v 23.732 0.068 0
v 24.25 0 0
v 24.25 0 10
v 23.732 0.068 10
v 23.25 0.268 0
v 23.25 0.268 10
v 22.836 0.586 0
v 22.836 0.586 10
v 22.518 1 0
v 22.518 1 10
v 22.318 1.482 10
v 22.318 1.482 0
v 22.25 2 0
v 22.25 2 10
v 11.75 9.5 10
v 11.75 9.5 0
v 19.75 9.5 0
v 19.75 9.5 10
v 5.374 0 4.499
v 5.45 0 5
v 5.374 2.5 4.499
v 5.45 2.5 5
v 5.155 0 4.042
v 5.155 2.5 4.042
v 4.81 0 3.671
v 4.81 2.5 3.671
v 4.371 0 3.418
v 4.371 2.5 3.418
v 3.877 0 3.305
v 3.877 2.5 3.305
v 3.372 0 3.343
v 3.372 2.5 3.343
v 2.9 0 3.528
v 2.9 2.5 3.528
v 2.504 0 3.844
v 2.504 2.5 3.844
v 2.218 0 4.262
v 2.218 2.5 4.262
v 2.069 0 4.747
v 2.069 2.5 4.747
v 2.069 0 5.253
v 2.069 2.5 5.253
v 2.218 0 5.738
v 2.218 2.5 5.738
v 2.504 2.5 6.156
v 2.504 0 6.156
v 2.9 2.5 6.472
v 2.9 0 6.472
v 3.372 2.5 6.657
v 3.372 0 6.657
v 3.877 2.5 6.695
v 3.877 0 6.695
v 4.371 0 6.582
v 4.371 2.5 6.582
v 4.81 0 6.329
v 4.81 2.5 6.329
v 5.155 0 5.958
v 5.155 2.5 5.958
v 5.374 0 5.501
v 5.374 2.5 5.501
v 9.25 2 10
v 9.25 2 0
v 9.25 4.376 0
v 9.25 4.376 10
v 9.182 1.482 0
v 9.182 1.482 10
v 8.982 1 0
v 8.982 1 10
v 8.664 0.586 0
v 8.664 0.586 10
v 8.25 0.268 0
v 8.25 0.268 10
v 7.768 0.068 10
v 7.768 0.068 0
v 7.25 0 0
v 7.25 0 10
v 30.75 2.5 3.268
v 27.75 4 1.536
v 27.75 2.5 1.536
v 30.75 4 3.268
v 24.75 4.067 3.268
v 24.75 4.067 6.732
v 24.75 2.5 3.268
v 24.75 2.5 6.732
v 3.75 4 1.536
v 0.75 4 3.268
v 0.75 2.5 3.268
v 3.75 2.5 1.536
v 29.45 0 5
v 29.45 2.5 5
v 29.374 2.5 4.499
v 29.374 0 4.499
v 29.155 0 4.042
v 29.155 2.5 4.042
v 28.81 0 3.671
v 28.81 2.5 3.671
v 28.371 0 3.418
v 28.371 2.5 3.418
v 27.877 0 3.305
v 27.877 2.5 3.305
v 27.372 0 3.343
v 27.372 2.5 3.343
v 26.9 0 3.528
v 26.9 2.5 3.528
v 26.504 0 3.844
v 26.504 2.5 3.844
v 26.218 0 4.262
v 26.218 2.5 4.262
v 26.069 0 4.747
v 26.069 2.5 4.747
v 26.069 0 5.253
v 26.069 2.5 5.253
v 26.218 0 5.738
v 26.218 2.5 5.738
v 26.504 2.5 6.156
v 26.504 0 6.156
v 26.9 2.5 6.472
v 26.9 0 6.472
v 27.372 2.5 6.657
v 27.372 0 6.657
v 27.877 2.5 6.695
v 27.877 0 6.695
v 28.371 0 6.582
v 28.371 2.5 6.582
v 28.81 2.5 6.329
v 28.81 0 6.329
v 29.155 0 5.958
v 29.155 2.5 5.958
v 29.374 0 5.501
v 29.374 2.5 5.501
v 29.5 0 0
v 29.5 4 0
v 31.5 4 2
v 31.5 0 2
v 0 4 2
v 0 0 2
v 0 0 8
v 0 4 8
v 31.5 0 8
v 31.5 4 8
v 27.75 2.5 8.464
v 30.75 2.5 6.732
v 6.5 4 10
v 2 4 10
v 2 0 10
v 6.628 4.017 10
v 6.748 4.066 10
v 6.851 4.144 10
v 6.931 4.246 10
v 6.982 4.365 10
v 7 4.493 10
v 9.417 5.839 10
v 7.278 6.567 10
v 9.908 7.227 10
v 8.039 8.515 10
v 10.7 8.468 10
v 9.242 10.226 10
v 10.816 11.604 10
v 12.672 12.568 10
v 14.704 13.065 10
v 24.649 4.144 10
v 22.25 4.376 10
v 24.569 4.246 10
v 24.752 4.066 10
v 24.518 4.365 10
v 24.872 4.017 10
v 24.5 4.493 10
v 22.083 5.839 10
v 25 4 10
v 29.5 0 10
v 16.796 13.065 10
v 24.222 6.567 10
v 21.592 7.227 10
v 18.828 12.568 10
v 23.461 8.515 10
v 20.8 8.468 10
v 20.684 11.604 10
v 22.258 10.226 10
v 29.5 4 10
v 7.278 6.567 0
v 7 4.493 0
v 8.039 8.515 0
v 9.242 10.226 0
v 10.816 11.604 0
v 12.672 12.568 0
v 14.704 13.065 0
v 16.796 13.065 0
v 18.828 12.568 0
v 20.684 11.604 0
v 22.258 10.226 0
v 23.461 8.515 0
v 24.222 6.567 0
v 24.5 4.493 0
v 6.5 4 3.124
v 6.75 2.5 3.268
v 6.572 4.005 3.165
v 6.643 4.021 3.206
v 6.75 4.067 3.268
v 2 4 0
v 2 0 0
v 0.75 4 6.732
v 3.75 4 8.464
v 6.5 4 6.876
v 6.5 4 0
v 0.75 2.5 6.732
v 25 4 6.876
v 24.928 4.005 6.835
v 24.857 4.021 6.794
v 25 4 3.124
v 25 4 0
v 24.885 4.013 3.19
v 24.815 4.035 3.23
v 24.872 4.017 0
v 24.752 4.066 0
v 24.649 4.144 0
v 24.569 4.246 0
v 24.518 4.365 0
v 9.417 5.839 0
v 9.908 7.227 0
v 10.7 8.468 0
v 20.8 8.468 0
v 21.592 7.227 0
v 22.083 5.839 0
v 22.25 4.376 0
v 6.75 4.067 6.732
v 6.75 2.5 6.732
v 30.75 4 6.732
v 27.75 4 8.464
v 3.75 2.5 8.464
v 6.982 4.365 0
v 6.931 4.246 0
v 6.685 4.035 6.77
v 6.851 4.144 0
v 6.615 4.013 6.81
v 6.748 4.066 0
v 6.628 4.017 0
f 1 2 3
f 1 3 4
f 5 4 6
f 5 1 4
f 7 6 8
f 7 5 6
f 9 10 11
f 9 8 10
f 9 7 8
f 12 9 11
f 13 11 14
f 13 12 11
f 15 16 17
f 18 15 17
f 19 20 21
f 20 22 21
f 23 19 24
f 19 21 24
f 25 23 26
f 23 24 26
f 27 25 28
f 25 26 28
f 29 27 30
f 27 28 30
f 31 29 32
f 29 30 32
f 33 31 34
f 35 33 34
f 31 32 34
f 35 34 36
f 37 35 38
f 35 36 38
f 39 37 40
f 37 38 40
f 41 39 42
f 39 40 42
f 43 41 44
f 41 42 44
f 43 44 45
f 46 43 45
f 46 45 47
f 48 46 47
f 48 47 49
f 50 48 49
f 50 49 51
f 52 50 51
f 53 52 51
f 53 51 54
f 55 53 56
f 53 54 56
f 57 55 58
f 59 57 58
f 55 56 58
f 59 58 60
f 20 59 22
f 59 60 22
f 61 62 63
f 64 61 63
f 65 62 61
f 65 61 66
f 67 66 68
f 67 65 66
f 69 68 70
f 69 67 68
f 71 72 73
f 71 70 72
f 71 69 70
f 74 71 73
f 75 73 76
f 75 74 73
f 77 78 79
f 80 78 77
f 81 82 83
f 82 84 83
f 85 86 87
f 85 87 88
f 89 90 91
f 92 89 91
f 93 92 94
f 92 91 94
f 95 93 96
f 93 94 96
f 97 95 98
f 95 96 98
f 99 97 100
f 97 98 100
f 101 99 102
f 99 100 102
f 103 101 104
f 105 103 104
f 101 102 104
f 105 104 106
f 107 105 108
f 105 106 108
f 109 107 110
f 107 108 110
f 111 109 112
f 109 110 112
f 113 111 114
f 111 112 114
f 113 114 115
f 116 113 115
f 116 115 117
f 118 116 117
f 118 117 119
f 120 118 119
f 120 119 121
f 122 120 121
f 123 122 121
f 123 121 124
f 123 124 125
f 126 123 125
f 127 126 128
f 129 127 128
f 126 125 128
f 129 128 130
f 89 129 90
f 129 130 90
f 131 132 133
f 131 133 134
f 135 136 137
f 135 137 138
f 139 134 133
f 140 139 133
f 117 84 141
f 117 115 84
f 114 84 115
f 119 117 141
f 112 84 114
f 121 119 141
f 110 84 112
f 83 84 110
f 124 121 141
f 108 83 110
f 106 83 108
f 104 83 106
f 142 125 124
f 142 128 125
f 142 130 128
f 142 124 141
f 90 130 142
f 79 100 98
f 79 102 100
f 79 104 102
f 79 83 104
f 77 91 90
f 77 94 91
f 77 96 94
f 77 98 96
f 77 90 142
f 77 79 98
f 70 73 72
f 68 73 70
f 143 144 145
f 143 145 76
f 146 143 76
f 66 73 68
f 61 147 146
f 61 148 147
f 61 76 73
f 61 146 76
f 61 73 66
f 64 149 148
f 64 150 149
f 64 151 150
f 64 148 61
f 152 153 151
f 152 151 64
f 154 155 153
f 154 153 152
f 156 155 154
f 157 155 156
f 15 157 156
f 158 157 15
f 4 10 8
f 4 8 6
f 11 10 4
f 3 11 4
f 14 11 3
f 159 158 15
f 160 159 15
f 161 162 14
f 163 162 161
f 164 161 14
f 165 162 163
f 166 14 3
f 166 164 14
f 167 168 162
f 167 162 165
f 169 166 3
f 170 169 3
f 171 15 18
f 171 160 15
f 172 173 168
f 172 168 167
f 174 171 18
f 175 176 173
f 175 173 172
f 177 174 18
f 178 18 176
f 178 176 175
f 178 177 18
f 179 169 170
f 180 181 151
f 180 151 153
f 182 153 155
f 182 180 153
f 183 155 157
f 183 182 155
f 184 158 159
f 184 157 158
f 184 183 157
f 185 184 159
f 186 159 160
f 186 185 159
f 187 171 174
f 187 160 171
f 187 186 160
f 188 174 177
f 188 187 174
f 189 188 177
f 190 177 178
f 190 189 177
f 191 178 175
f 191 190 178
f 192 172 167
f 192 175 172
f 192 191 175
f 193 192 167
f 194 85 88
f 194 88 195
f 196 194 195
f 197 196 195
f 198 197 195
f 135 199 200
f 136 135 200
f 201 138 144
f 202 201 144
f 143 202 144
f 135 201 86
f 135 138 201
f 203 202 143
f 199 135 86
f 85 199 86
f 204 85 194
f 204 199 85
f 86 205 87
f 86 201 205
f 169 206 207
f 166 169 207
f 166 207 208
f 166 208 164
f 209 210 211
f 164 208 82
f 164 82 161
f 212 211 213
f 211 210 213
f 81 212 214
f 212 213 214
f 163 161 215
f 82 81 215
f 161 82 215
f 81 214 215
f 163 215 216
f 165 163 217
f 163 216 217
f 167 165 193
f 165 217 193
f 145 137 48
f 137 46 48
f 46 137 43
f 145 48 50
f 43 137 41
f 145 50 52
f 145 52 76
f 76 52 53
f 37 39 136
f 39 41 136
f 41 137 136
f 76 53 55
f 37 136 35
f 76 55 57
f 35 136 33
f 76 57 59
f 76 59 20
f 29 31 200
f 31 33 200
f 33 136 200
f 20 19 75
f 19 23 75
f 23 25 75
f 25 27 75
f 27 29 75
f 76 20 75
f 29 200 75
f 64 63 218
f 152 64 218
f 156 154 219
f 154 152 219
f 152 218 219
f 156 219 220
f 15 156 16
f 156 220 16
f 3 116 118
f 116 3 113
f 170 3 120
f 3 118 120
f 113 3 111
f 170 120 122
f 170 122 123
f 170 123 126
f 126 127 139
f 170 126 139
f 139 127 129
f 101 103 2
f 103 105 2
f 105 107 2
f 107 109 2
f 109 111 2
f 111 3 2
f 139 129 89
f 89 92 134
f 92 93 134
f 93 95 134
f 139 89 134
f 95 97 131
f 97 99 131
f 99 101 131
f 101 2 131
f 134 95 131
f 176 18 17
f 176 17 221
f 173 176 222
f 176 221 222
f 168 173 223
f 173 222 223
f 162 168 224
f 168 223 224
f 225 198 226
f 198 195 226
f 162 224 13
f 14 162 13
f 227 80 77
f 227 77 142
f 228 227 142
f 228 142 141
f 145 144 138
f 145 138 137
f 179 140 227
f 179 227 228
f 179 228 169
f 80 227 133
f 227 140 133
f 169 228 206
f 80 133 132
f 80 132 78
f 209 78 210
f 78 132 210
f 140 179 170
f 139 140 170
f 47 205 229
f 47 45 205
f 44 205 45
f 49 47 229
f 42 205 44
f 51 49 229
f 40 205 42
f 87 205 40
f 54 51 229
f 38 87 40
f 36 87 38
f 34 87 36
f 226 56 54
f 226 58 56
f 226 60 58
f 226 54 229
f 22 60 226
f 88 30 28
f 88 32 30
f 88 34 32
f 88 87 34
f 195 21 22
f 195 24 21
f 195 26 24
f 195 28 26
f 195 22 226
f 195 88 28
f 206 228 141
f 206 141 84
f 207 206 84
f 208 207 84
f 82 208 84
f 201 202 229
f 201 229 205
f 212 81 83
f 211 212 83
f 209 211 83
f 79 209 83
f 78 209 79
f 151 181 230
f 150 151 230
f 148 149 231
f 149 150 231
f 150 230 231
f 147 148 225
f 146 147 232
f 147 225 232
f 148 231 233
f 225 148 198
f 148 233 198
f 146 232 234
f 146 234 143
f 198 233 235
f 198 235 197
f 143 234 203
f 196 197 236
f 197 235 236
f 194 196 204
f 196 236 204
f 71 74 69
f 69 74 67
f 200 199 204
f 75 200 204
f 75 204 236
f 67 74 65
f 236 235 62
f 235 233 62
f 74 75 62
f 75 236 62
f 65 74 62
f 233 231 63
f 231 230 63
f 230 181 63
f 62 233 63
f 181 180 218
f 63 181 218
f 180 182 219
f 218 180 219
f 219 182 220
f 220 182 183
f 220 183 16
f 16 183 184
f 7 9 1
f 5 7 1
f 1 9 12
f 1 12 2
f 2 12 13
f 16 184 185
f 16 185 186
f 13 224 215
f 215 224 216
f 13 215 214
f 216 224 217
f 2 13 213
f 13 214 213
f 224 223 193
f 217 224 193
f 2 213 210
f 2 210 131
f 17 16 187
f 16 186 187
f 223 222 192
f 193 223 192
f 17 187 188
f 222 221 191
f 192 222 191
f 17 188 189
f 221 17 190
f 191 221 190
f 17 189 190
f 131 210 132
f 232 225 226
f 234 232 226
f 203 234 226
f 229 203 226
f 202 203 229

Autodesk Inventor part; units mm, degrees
ref_plane "YZ Plane" through (0, 0, 0) normal (1, 0, 0) x (0, 1, 0)
ref_plane "XZ Plane" through (0, 0, 0) normal (0, 1, 0) x (-1, 0, 0)
ref_plane "XY Plane" through (0, 0, 0) normal (0, 0, 1) x (1, 0, 0)
sketch "Sketch1" plane through (0, 0, 0) normal (0, 0, 1) x (1, 0, 0)
  line L0 (0, 0) -> (7.25, 0)
  line L1 (0, 0) -> (0, 4)
  line L2 (0, 4) -> (6.5, 4)
  line L3 (9.25, 2) -> (9.25, 4.3765)
  arc A0 (11.75, 9.5) -> (9.25, 4.3765) centre (15.75, 4.3765) ccw
  arc A1 (7.25, 0) -> (9.25, 2) centre (7.25, 2) ccw
  line L4 (3.4828, -0.5) -> (32.44, -0.5) construction
  arc A2 (6.5, 4) -> (7, 4.4933) centre (6.5, 4.5) ccw
  line L5 (11.75, 9.5) -> (15.75, 9.5)
  line L6 (15.75, 9.5) -> (15.75, 6.4102) construction
  line L7 (15.75, 9.5) -> (19.75, 9.5)
  arc A3 (22.25, 4.3765) -> (19.75, 9.5) centre (15.75, 4.3765) ccw
  line L8 (22.25, 4.3765) -> (22.25, 2)
  arc A4 (22.25, 2) -> (24.25, 0) centre (24.25, 2) ccw
  line L9 (24.25, 0) -> (31.5, 0)
  line L10 (31.5, 0) -> (31.5, 4)
  line L11 (31.5, 4) -> (25, 4)
  arc A5 (24.5, 4.4933) -> (25, 4) centre (25, 4.5) ccw
  arc A6 (24.5, 4.4933) -> (7, 4.4933) centre (15.75, 4.3765) ccw
  line L12 (3.25, 4) -> (3.25, 2) construction
  line L13 (28.25, 4) -> (28.25, 2.1903) construction
  point P0 (6.9889, 4)
  dimension "d0" = 4
  dimension "d4" = 2
  dimension "d6" = 6.5
  dimension "d7" = 0.5
  dimension "d9" = 0.5
  dimension "d10" = 4
  dimension "d11" = 6.5
  dimension "d12" = 6.5
  dimension "d13" = 10
  dimension "d14" = 25
extrude "Extrusion1" add sketch "Sketch1" along normal blind 10
chamfer "Chamfer1" distance 2 angle 45 4 edges at (0, 2, 10) (0, 2, 0) (31.5, 2, 10) (31.5, 2, 0)
sketch "Sketch2" plane through (6.5, 4, 10) normal (0, 1, 0) x (1, 0, 0)
  line L0 (-6.5, 8) -> (-6.5, 2) projected
  line L1 (-6.5, 5) -> (25, 5) construction
  line L2 (25, 8) -> (25, 2) projected
  circle A0 centre (-2.75, 5) radius 3.75 construction
  circle A1 centre (21.25, 5) radius 3.75 construction
  circle A2 centre (-2.75, 5) radius 1.7
  circle A3 centre (21.25, 5) radius 1.7
  line L3 (-2.75, 8.4641) -> (0.25, 6.7321)
  line L4 (0.25, 6.7321) -> (0.25, 3.2679)
  line L5 (0.25, 3.2679) -> (-2.75, 1.5359)
  line L6 (-2.75, 1.5359) -> (-5.75, 3.2679)
  line L7 (-5.75, 3.2679) -> (-5.75, 6.7321)
  line L8 (-5.75, 6.7321) -> (-2.75, 8.4641)
  line L9 (21.25, 8.4641) -> (24.25, 6.7321)
  line L10 (24.25, 6.7321) -> (24.25, 3.2679)
  line L11 (24.25, 3.2679) -> (21.25, 1.5359)
  line L12 (21.25, 1.5359) -> (18.25, 3.2679)
  line L13 (18.25, 3.2679) -> (18.25, 6.7321)
  line L14 (18.25, 6.7321) -> (21.25, 8.4641)
  point P0 (-6.5, 10)
  dimension "d20" = 24
  dimension "d21" = 3.4
  dimension "d22" = 6
extrude "Extrusion2" cut sketch "Sketch2" along normal blind 10 contours A2 | A3 | L3 L4 L5 L6 L7 L8 | L9 L10 L11 L12 L13 L14
extrude "Extrusion3" cut sketch "Sketch2" against normal through all contours A2 | A3
extrude "Extrusion4" cut sketch "Sketch2" against normal blind 1.5 contours A2 | A3 | L3 L4 L5 L6 L7 L8 | L9 L10 L11 L12 L13 L14
properties part number "motor-clamp"
